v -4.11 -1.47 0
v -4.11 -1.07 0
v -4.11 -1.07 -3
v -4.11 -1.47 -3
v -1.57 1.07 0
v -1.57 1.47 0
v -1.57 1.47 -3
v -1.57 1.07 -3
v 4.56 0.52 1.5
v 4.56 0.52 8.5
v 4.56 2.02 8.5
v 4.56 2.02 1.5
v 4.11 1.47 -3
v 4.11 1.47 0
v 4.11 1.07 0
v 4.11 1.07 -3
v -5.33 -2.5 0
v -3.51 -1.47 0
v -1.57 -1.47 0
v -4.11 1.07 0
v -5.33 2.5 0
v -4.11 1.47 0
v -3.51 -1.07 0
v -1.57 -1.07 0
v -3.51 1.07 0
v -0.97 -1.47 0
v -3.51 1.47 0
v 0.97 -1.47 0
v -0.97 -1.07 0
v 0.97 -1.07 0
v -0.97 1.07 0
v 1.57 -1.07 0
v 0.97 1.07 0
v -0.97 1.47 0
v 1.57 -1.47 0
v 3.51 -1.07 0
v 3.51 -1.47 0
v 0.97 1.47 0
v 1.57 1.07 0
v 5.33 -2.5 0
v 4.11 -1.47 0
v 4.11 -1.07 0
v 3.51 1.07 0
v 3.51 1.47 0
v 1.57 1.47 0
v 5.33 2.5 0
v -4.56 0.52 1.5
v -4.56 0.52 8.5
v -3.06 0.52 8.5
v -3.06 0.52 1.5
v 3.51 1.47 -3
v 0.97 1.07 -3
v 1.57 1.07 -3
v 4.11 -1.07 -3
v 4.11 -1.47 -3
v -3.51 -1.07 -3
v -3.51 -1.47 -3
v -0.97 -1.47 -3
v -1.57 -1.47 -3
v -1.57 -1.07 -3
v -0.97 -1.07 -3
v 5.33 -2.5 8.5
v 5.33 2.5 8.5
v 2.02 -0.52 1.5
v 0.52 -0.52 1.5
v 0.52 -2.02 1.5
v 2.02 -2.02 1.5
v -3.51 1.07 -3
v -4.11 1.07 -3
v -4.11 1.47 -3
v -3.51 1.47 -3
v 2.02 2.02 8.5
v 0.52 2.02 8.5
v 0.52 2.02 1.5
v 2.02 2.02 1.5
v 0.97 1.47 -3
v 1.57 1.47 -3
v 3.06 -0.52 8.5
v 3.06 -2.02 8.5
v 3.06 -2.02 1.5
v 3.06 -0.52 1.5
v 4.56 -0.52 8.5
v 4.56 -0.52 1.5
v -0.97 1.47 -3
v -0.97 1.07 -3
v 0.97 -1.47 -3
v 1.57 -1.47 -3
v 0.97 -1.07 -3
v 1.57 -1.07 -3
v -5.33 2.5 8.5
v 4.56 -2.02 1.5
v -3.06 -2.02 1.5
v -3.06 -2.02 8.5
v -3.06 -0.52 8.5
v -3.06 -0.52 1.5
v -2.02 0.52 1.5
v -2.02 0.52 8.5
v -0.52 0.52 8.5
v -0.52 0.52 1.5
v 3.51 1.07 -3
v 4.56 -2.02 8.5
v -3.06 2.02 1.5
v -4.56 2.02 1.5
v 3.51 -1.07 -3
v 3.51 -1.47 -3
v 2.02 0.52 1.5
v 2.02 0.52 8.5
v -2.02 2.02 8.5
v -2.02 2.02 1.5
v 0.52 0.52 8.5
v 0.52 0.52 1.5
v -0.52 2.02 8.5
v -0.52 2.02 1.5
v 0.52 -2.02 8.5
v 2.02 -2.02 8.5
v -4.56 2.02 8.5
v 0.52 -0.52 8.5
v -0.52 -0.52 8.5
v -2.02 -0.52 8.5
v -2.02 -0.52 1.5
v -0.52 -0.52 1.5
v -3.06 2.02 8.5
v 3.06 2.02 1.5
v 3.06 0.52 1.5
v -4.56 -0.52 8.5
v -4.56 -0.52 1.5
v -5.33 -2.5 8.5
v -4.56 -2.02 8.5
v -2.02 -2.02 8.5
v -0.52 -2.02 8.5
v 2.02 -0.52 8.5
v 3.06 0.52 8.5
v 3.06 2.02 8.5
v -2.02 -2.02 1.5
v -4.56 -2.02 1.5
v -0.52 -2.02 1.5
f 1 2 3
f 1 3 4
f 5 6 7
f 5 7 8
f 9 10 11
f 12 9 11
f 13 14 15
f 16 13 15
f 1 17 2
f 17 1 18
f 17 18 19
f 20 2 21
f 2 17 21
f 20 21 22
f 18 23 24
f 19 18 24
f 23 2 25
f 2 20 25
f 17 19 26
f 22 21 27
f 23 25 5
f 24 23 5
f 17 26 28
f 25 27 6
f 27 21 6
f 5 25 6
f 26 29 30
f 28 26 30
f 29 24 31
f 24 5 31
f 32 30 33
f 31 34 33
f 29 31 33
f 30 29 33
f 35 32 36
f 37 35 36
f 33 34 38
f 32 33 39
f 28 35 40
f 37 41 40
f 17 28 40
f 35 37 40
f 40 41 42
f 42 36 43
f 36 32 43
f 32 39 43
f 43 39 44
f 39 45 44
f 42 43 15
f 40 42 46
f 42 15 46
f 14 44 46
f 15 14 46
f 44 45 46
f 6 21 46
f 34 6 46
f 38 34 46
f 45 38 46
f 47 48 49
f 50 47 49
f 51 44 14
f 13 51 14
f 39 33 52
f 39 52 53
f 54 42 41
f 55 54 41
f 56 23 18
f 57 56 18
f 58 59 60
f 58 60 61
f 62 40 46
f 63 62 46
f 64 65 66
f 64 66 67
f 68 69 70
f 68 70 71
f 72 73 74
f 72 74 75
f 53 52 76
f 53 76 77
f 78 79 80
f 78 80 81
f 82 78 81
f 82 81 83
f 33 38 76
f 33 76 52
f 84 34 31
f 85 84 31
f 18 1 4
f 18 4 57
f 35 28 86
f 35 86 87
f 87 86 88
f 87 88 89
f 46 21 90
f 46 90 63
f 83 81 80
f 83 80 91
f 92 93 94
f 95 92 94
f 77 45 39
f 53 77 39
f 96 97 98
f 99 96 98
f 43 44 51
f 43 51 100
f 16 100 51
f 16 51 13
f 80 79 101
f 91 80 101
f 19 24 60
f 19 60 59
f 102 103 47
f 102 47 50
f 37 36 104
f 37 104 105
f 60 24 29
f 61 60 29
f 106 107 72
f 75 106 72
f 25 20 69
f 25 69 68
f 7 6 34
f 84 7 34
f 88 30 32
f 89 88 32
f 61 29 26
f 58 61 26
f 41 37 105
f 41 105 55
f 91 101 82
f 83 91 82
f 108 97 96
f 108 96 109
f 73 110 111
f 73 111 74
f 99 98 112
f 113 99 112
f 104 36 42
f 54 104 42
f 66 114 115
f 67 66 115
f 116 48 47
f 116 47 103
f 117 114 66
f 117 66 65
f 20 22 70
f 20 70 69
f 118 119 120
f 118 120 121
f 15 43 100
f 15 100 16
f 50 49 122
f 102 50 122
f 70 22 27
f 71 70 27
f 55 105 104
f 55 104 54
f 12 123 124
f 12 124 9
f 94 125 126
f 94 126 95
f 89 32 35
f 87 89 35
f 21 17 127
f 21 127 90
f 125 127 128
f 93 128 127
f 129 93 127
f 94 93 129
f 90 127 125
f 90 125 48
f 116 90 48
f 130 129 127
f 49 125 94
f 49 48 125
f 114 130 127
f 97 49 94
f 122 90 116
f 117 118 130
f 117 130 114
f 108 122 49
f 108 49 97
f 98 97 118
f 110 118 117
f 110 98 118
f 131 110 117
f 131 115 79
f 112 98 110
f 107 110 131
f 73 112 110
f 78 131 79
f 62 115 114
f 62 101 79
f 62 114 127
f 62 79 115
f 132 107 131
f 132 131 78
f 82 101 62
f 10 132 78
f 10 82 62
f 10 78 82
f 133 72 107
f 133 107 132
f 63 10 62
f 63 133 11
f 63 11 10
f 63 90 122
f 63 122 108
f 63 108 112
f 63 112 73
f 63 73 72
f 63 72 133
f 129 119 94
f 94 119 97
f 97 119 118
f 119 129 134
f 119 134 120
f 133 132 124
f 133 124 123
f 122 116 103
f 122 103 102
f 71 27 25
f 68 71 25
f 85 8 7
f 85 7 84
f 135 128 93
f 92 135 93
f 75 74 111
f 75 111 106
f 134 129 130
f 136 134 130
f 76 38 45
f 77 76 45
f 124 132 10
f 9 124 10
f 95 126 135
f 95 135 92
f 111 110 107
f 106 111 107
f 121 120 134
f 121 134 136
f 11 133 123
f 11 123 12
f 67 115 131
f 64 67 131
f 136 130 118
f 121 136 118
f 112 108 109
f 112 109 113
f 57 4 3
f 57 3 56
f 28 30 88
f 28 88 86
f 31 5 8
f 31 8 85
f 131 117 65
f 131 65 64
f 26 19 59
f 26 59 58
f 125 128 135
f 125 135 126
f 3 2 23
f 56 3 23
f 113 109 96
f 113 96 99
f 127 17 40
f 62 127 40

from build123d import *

# Parameters (mm, degrees)
F0_W     = 10.66
F0_H     = 5
F1_DEPTH = 8.5
F2_W     = 1.5
F2_H     = 1.5
F3_DEPTH = 7
F4_W     = 0.6
F4_H     = 0.4
F5_DEPTH = 3


with BuildPart() as f1:
    # F0 (on Top) → F1 (new body)
    with BuildSketch(Plane.XY):
        Rectangle(F0_W, F0_H)
    extrude(amount=F1_DEPTH)

    # F2 (on face) → F3 (cut)
    with BuildSketch(Plane.XY.offset(8.5)):
        with Locations((-3.81, 1.27)):
            Rectangle(F2_W, F2_H)
        with Locations((-3.81, -1.27)):
            Rectangle(F2_W, F2_H)
        with Locations((-1.27, 1.27)):
            Rectangle(F2_W, F2_H)
        with Locations((-1.27, -1.27)):
            Rectangle(F2_W, F2_H)
        with Locations((1.27, 1.27)):
            Rectangle(F2_W, F2_H)
        with Locations((1.27, -1.27)):
            Rectangle(F2_W, F2_H)
        with Locations((3.81, 1.27)):
            Rectangle(F2_W, F2_H)
        with Locations((3.81, -1.27)):
            Rectangle(F2_W, F2_H)
        with Locations((6.35, 1.27)):
            Rectangle(F2_W, F2_H)
        with Locations((6.35, -1.27)):
            Rectangle(F2_W, F2_H)
        with Locations((8.89, 1.27)):
            Rectangle(F2_W, F2_H)
        with Locations((8.89, -1.27)):
            Rectangle(F2_W, F2_H)
    extrude(amount=-F3_DEPTH, mode=Mode.SUBTRACT)

    # F4 (on face) → F5 (join)
    with BuildSketch(Plane(origin=(0, 0, 0), x_dir=(1, 0, 0), z_dir=(0, 0, -1))):
        with Locations((-3.81, 1.27)):
            Rectangle(F4_W, F4_H)
        with Locations((-3.81, -1.27)):
            Rectangle(F4_W, F4_H)
        with Locations((-1.27, 1.27)):
            Rectangle(F4_W, F4_H)
        with Locations((-1.27, -1.27)):
            Rectangle(F4_W, F4_H)
        with Locations((1.27, 1.27)):
            Rectangle(F4_W, F4_H)
        with Locations((1.27, -1.27)):
            Rectangle(F4_W, F4_H)
        with Locations((3.81, 1.27)):
            Rectangle(F4_W, F4_H)
        with Locations((3.81, -1.27)):
            Rectangle(F4_W, F4_H)
    extrude(amount=F5_DEPTH)


with BuildPart() as f5:
    # F4 (on face) → F5, piece 2 (new body)
    with BuildSketch(Plane(origin=(0, 0, 0), x_dir=(1, 0, 0), z_dir=(0, 0, -1))):
        with Locations((6.35, 1.27)):
            Rectangle(F4_W, F4_H)
    extrude(amount=F5_DEPTH)


with BuildPart() as f5b:
    # F4 (on face) → F5, piece 3 (new body)
    with BuildSketch(Plane(origin=(0, 0, 0), x_dir=(1, 0, 0), z_dir=(0, 0, -1))):
        with Locations((6.35, -1.27)):
            Rectangle(F4_W, F4_H)
    extrude(amount=F5_DEPTH)


with BuildPart() as f5c:
    # F4 (on face) → F5, piece 4 (new body)
    with BuildSketch(Plane(origin=(0, 0, 0), x_dir=(1, 0, 0), z_dir=(0, 0, -1))):
        with Locations((8.89, 1.27)):
            Rectangle(F4_W, F4_H)
    extrude(amount=F5_DEPTH)


with BuildPart() as f5d:
    # F4 (on face) → F5, piece 5 (new body)
    with BuildSketch(Plane(origin=(0, 0, 0), x_dir=(1, 0, 0), z_dir=(0, 0, -1))):
        with Locations((8.89, -1.27)):
            Rectangle(F4_W, F4_H)
    extrude(amount=F5_DEPTH)


solid = f1.part
